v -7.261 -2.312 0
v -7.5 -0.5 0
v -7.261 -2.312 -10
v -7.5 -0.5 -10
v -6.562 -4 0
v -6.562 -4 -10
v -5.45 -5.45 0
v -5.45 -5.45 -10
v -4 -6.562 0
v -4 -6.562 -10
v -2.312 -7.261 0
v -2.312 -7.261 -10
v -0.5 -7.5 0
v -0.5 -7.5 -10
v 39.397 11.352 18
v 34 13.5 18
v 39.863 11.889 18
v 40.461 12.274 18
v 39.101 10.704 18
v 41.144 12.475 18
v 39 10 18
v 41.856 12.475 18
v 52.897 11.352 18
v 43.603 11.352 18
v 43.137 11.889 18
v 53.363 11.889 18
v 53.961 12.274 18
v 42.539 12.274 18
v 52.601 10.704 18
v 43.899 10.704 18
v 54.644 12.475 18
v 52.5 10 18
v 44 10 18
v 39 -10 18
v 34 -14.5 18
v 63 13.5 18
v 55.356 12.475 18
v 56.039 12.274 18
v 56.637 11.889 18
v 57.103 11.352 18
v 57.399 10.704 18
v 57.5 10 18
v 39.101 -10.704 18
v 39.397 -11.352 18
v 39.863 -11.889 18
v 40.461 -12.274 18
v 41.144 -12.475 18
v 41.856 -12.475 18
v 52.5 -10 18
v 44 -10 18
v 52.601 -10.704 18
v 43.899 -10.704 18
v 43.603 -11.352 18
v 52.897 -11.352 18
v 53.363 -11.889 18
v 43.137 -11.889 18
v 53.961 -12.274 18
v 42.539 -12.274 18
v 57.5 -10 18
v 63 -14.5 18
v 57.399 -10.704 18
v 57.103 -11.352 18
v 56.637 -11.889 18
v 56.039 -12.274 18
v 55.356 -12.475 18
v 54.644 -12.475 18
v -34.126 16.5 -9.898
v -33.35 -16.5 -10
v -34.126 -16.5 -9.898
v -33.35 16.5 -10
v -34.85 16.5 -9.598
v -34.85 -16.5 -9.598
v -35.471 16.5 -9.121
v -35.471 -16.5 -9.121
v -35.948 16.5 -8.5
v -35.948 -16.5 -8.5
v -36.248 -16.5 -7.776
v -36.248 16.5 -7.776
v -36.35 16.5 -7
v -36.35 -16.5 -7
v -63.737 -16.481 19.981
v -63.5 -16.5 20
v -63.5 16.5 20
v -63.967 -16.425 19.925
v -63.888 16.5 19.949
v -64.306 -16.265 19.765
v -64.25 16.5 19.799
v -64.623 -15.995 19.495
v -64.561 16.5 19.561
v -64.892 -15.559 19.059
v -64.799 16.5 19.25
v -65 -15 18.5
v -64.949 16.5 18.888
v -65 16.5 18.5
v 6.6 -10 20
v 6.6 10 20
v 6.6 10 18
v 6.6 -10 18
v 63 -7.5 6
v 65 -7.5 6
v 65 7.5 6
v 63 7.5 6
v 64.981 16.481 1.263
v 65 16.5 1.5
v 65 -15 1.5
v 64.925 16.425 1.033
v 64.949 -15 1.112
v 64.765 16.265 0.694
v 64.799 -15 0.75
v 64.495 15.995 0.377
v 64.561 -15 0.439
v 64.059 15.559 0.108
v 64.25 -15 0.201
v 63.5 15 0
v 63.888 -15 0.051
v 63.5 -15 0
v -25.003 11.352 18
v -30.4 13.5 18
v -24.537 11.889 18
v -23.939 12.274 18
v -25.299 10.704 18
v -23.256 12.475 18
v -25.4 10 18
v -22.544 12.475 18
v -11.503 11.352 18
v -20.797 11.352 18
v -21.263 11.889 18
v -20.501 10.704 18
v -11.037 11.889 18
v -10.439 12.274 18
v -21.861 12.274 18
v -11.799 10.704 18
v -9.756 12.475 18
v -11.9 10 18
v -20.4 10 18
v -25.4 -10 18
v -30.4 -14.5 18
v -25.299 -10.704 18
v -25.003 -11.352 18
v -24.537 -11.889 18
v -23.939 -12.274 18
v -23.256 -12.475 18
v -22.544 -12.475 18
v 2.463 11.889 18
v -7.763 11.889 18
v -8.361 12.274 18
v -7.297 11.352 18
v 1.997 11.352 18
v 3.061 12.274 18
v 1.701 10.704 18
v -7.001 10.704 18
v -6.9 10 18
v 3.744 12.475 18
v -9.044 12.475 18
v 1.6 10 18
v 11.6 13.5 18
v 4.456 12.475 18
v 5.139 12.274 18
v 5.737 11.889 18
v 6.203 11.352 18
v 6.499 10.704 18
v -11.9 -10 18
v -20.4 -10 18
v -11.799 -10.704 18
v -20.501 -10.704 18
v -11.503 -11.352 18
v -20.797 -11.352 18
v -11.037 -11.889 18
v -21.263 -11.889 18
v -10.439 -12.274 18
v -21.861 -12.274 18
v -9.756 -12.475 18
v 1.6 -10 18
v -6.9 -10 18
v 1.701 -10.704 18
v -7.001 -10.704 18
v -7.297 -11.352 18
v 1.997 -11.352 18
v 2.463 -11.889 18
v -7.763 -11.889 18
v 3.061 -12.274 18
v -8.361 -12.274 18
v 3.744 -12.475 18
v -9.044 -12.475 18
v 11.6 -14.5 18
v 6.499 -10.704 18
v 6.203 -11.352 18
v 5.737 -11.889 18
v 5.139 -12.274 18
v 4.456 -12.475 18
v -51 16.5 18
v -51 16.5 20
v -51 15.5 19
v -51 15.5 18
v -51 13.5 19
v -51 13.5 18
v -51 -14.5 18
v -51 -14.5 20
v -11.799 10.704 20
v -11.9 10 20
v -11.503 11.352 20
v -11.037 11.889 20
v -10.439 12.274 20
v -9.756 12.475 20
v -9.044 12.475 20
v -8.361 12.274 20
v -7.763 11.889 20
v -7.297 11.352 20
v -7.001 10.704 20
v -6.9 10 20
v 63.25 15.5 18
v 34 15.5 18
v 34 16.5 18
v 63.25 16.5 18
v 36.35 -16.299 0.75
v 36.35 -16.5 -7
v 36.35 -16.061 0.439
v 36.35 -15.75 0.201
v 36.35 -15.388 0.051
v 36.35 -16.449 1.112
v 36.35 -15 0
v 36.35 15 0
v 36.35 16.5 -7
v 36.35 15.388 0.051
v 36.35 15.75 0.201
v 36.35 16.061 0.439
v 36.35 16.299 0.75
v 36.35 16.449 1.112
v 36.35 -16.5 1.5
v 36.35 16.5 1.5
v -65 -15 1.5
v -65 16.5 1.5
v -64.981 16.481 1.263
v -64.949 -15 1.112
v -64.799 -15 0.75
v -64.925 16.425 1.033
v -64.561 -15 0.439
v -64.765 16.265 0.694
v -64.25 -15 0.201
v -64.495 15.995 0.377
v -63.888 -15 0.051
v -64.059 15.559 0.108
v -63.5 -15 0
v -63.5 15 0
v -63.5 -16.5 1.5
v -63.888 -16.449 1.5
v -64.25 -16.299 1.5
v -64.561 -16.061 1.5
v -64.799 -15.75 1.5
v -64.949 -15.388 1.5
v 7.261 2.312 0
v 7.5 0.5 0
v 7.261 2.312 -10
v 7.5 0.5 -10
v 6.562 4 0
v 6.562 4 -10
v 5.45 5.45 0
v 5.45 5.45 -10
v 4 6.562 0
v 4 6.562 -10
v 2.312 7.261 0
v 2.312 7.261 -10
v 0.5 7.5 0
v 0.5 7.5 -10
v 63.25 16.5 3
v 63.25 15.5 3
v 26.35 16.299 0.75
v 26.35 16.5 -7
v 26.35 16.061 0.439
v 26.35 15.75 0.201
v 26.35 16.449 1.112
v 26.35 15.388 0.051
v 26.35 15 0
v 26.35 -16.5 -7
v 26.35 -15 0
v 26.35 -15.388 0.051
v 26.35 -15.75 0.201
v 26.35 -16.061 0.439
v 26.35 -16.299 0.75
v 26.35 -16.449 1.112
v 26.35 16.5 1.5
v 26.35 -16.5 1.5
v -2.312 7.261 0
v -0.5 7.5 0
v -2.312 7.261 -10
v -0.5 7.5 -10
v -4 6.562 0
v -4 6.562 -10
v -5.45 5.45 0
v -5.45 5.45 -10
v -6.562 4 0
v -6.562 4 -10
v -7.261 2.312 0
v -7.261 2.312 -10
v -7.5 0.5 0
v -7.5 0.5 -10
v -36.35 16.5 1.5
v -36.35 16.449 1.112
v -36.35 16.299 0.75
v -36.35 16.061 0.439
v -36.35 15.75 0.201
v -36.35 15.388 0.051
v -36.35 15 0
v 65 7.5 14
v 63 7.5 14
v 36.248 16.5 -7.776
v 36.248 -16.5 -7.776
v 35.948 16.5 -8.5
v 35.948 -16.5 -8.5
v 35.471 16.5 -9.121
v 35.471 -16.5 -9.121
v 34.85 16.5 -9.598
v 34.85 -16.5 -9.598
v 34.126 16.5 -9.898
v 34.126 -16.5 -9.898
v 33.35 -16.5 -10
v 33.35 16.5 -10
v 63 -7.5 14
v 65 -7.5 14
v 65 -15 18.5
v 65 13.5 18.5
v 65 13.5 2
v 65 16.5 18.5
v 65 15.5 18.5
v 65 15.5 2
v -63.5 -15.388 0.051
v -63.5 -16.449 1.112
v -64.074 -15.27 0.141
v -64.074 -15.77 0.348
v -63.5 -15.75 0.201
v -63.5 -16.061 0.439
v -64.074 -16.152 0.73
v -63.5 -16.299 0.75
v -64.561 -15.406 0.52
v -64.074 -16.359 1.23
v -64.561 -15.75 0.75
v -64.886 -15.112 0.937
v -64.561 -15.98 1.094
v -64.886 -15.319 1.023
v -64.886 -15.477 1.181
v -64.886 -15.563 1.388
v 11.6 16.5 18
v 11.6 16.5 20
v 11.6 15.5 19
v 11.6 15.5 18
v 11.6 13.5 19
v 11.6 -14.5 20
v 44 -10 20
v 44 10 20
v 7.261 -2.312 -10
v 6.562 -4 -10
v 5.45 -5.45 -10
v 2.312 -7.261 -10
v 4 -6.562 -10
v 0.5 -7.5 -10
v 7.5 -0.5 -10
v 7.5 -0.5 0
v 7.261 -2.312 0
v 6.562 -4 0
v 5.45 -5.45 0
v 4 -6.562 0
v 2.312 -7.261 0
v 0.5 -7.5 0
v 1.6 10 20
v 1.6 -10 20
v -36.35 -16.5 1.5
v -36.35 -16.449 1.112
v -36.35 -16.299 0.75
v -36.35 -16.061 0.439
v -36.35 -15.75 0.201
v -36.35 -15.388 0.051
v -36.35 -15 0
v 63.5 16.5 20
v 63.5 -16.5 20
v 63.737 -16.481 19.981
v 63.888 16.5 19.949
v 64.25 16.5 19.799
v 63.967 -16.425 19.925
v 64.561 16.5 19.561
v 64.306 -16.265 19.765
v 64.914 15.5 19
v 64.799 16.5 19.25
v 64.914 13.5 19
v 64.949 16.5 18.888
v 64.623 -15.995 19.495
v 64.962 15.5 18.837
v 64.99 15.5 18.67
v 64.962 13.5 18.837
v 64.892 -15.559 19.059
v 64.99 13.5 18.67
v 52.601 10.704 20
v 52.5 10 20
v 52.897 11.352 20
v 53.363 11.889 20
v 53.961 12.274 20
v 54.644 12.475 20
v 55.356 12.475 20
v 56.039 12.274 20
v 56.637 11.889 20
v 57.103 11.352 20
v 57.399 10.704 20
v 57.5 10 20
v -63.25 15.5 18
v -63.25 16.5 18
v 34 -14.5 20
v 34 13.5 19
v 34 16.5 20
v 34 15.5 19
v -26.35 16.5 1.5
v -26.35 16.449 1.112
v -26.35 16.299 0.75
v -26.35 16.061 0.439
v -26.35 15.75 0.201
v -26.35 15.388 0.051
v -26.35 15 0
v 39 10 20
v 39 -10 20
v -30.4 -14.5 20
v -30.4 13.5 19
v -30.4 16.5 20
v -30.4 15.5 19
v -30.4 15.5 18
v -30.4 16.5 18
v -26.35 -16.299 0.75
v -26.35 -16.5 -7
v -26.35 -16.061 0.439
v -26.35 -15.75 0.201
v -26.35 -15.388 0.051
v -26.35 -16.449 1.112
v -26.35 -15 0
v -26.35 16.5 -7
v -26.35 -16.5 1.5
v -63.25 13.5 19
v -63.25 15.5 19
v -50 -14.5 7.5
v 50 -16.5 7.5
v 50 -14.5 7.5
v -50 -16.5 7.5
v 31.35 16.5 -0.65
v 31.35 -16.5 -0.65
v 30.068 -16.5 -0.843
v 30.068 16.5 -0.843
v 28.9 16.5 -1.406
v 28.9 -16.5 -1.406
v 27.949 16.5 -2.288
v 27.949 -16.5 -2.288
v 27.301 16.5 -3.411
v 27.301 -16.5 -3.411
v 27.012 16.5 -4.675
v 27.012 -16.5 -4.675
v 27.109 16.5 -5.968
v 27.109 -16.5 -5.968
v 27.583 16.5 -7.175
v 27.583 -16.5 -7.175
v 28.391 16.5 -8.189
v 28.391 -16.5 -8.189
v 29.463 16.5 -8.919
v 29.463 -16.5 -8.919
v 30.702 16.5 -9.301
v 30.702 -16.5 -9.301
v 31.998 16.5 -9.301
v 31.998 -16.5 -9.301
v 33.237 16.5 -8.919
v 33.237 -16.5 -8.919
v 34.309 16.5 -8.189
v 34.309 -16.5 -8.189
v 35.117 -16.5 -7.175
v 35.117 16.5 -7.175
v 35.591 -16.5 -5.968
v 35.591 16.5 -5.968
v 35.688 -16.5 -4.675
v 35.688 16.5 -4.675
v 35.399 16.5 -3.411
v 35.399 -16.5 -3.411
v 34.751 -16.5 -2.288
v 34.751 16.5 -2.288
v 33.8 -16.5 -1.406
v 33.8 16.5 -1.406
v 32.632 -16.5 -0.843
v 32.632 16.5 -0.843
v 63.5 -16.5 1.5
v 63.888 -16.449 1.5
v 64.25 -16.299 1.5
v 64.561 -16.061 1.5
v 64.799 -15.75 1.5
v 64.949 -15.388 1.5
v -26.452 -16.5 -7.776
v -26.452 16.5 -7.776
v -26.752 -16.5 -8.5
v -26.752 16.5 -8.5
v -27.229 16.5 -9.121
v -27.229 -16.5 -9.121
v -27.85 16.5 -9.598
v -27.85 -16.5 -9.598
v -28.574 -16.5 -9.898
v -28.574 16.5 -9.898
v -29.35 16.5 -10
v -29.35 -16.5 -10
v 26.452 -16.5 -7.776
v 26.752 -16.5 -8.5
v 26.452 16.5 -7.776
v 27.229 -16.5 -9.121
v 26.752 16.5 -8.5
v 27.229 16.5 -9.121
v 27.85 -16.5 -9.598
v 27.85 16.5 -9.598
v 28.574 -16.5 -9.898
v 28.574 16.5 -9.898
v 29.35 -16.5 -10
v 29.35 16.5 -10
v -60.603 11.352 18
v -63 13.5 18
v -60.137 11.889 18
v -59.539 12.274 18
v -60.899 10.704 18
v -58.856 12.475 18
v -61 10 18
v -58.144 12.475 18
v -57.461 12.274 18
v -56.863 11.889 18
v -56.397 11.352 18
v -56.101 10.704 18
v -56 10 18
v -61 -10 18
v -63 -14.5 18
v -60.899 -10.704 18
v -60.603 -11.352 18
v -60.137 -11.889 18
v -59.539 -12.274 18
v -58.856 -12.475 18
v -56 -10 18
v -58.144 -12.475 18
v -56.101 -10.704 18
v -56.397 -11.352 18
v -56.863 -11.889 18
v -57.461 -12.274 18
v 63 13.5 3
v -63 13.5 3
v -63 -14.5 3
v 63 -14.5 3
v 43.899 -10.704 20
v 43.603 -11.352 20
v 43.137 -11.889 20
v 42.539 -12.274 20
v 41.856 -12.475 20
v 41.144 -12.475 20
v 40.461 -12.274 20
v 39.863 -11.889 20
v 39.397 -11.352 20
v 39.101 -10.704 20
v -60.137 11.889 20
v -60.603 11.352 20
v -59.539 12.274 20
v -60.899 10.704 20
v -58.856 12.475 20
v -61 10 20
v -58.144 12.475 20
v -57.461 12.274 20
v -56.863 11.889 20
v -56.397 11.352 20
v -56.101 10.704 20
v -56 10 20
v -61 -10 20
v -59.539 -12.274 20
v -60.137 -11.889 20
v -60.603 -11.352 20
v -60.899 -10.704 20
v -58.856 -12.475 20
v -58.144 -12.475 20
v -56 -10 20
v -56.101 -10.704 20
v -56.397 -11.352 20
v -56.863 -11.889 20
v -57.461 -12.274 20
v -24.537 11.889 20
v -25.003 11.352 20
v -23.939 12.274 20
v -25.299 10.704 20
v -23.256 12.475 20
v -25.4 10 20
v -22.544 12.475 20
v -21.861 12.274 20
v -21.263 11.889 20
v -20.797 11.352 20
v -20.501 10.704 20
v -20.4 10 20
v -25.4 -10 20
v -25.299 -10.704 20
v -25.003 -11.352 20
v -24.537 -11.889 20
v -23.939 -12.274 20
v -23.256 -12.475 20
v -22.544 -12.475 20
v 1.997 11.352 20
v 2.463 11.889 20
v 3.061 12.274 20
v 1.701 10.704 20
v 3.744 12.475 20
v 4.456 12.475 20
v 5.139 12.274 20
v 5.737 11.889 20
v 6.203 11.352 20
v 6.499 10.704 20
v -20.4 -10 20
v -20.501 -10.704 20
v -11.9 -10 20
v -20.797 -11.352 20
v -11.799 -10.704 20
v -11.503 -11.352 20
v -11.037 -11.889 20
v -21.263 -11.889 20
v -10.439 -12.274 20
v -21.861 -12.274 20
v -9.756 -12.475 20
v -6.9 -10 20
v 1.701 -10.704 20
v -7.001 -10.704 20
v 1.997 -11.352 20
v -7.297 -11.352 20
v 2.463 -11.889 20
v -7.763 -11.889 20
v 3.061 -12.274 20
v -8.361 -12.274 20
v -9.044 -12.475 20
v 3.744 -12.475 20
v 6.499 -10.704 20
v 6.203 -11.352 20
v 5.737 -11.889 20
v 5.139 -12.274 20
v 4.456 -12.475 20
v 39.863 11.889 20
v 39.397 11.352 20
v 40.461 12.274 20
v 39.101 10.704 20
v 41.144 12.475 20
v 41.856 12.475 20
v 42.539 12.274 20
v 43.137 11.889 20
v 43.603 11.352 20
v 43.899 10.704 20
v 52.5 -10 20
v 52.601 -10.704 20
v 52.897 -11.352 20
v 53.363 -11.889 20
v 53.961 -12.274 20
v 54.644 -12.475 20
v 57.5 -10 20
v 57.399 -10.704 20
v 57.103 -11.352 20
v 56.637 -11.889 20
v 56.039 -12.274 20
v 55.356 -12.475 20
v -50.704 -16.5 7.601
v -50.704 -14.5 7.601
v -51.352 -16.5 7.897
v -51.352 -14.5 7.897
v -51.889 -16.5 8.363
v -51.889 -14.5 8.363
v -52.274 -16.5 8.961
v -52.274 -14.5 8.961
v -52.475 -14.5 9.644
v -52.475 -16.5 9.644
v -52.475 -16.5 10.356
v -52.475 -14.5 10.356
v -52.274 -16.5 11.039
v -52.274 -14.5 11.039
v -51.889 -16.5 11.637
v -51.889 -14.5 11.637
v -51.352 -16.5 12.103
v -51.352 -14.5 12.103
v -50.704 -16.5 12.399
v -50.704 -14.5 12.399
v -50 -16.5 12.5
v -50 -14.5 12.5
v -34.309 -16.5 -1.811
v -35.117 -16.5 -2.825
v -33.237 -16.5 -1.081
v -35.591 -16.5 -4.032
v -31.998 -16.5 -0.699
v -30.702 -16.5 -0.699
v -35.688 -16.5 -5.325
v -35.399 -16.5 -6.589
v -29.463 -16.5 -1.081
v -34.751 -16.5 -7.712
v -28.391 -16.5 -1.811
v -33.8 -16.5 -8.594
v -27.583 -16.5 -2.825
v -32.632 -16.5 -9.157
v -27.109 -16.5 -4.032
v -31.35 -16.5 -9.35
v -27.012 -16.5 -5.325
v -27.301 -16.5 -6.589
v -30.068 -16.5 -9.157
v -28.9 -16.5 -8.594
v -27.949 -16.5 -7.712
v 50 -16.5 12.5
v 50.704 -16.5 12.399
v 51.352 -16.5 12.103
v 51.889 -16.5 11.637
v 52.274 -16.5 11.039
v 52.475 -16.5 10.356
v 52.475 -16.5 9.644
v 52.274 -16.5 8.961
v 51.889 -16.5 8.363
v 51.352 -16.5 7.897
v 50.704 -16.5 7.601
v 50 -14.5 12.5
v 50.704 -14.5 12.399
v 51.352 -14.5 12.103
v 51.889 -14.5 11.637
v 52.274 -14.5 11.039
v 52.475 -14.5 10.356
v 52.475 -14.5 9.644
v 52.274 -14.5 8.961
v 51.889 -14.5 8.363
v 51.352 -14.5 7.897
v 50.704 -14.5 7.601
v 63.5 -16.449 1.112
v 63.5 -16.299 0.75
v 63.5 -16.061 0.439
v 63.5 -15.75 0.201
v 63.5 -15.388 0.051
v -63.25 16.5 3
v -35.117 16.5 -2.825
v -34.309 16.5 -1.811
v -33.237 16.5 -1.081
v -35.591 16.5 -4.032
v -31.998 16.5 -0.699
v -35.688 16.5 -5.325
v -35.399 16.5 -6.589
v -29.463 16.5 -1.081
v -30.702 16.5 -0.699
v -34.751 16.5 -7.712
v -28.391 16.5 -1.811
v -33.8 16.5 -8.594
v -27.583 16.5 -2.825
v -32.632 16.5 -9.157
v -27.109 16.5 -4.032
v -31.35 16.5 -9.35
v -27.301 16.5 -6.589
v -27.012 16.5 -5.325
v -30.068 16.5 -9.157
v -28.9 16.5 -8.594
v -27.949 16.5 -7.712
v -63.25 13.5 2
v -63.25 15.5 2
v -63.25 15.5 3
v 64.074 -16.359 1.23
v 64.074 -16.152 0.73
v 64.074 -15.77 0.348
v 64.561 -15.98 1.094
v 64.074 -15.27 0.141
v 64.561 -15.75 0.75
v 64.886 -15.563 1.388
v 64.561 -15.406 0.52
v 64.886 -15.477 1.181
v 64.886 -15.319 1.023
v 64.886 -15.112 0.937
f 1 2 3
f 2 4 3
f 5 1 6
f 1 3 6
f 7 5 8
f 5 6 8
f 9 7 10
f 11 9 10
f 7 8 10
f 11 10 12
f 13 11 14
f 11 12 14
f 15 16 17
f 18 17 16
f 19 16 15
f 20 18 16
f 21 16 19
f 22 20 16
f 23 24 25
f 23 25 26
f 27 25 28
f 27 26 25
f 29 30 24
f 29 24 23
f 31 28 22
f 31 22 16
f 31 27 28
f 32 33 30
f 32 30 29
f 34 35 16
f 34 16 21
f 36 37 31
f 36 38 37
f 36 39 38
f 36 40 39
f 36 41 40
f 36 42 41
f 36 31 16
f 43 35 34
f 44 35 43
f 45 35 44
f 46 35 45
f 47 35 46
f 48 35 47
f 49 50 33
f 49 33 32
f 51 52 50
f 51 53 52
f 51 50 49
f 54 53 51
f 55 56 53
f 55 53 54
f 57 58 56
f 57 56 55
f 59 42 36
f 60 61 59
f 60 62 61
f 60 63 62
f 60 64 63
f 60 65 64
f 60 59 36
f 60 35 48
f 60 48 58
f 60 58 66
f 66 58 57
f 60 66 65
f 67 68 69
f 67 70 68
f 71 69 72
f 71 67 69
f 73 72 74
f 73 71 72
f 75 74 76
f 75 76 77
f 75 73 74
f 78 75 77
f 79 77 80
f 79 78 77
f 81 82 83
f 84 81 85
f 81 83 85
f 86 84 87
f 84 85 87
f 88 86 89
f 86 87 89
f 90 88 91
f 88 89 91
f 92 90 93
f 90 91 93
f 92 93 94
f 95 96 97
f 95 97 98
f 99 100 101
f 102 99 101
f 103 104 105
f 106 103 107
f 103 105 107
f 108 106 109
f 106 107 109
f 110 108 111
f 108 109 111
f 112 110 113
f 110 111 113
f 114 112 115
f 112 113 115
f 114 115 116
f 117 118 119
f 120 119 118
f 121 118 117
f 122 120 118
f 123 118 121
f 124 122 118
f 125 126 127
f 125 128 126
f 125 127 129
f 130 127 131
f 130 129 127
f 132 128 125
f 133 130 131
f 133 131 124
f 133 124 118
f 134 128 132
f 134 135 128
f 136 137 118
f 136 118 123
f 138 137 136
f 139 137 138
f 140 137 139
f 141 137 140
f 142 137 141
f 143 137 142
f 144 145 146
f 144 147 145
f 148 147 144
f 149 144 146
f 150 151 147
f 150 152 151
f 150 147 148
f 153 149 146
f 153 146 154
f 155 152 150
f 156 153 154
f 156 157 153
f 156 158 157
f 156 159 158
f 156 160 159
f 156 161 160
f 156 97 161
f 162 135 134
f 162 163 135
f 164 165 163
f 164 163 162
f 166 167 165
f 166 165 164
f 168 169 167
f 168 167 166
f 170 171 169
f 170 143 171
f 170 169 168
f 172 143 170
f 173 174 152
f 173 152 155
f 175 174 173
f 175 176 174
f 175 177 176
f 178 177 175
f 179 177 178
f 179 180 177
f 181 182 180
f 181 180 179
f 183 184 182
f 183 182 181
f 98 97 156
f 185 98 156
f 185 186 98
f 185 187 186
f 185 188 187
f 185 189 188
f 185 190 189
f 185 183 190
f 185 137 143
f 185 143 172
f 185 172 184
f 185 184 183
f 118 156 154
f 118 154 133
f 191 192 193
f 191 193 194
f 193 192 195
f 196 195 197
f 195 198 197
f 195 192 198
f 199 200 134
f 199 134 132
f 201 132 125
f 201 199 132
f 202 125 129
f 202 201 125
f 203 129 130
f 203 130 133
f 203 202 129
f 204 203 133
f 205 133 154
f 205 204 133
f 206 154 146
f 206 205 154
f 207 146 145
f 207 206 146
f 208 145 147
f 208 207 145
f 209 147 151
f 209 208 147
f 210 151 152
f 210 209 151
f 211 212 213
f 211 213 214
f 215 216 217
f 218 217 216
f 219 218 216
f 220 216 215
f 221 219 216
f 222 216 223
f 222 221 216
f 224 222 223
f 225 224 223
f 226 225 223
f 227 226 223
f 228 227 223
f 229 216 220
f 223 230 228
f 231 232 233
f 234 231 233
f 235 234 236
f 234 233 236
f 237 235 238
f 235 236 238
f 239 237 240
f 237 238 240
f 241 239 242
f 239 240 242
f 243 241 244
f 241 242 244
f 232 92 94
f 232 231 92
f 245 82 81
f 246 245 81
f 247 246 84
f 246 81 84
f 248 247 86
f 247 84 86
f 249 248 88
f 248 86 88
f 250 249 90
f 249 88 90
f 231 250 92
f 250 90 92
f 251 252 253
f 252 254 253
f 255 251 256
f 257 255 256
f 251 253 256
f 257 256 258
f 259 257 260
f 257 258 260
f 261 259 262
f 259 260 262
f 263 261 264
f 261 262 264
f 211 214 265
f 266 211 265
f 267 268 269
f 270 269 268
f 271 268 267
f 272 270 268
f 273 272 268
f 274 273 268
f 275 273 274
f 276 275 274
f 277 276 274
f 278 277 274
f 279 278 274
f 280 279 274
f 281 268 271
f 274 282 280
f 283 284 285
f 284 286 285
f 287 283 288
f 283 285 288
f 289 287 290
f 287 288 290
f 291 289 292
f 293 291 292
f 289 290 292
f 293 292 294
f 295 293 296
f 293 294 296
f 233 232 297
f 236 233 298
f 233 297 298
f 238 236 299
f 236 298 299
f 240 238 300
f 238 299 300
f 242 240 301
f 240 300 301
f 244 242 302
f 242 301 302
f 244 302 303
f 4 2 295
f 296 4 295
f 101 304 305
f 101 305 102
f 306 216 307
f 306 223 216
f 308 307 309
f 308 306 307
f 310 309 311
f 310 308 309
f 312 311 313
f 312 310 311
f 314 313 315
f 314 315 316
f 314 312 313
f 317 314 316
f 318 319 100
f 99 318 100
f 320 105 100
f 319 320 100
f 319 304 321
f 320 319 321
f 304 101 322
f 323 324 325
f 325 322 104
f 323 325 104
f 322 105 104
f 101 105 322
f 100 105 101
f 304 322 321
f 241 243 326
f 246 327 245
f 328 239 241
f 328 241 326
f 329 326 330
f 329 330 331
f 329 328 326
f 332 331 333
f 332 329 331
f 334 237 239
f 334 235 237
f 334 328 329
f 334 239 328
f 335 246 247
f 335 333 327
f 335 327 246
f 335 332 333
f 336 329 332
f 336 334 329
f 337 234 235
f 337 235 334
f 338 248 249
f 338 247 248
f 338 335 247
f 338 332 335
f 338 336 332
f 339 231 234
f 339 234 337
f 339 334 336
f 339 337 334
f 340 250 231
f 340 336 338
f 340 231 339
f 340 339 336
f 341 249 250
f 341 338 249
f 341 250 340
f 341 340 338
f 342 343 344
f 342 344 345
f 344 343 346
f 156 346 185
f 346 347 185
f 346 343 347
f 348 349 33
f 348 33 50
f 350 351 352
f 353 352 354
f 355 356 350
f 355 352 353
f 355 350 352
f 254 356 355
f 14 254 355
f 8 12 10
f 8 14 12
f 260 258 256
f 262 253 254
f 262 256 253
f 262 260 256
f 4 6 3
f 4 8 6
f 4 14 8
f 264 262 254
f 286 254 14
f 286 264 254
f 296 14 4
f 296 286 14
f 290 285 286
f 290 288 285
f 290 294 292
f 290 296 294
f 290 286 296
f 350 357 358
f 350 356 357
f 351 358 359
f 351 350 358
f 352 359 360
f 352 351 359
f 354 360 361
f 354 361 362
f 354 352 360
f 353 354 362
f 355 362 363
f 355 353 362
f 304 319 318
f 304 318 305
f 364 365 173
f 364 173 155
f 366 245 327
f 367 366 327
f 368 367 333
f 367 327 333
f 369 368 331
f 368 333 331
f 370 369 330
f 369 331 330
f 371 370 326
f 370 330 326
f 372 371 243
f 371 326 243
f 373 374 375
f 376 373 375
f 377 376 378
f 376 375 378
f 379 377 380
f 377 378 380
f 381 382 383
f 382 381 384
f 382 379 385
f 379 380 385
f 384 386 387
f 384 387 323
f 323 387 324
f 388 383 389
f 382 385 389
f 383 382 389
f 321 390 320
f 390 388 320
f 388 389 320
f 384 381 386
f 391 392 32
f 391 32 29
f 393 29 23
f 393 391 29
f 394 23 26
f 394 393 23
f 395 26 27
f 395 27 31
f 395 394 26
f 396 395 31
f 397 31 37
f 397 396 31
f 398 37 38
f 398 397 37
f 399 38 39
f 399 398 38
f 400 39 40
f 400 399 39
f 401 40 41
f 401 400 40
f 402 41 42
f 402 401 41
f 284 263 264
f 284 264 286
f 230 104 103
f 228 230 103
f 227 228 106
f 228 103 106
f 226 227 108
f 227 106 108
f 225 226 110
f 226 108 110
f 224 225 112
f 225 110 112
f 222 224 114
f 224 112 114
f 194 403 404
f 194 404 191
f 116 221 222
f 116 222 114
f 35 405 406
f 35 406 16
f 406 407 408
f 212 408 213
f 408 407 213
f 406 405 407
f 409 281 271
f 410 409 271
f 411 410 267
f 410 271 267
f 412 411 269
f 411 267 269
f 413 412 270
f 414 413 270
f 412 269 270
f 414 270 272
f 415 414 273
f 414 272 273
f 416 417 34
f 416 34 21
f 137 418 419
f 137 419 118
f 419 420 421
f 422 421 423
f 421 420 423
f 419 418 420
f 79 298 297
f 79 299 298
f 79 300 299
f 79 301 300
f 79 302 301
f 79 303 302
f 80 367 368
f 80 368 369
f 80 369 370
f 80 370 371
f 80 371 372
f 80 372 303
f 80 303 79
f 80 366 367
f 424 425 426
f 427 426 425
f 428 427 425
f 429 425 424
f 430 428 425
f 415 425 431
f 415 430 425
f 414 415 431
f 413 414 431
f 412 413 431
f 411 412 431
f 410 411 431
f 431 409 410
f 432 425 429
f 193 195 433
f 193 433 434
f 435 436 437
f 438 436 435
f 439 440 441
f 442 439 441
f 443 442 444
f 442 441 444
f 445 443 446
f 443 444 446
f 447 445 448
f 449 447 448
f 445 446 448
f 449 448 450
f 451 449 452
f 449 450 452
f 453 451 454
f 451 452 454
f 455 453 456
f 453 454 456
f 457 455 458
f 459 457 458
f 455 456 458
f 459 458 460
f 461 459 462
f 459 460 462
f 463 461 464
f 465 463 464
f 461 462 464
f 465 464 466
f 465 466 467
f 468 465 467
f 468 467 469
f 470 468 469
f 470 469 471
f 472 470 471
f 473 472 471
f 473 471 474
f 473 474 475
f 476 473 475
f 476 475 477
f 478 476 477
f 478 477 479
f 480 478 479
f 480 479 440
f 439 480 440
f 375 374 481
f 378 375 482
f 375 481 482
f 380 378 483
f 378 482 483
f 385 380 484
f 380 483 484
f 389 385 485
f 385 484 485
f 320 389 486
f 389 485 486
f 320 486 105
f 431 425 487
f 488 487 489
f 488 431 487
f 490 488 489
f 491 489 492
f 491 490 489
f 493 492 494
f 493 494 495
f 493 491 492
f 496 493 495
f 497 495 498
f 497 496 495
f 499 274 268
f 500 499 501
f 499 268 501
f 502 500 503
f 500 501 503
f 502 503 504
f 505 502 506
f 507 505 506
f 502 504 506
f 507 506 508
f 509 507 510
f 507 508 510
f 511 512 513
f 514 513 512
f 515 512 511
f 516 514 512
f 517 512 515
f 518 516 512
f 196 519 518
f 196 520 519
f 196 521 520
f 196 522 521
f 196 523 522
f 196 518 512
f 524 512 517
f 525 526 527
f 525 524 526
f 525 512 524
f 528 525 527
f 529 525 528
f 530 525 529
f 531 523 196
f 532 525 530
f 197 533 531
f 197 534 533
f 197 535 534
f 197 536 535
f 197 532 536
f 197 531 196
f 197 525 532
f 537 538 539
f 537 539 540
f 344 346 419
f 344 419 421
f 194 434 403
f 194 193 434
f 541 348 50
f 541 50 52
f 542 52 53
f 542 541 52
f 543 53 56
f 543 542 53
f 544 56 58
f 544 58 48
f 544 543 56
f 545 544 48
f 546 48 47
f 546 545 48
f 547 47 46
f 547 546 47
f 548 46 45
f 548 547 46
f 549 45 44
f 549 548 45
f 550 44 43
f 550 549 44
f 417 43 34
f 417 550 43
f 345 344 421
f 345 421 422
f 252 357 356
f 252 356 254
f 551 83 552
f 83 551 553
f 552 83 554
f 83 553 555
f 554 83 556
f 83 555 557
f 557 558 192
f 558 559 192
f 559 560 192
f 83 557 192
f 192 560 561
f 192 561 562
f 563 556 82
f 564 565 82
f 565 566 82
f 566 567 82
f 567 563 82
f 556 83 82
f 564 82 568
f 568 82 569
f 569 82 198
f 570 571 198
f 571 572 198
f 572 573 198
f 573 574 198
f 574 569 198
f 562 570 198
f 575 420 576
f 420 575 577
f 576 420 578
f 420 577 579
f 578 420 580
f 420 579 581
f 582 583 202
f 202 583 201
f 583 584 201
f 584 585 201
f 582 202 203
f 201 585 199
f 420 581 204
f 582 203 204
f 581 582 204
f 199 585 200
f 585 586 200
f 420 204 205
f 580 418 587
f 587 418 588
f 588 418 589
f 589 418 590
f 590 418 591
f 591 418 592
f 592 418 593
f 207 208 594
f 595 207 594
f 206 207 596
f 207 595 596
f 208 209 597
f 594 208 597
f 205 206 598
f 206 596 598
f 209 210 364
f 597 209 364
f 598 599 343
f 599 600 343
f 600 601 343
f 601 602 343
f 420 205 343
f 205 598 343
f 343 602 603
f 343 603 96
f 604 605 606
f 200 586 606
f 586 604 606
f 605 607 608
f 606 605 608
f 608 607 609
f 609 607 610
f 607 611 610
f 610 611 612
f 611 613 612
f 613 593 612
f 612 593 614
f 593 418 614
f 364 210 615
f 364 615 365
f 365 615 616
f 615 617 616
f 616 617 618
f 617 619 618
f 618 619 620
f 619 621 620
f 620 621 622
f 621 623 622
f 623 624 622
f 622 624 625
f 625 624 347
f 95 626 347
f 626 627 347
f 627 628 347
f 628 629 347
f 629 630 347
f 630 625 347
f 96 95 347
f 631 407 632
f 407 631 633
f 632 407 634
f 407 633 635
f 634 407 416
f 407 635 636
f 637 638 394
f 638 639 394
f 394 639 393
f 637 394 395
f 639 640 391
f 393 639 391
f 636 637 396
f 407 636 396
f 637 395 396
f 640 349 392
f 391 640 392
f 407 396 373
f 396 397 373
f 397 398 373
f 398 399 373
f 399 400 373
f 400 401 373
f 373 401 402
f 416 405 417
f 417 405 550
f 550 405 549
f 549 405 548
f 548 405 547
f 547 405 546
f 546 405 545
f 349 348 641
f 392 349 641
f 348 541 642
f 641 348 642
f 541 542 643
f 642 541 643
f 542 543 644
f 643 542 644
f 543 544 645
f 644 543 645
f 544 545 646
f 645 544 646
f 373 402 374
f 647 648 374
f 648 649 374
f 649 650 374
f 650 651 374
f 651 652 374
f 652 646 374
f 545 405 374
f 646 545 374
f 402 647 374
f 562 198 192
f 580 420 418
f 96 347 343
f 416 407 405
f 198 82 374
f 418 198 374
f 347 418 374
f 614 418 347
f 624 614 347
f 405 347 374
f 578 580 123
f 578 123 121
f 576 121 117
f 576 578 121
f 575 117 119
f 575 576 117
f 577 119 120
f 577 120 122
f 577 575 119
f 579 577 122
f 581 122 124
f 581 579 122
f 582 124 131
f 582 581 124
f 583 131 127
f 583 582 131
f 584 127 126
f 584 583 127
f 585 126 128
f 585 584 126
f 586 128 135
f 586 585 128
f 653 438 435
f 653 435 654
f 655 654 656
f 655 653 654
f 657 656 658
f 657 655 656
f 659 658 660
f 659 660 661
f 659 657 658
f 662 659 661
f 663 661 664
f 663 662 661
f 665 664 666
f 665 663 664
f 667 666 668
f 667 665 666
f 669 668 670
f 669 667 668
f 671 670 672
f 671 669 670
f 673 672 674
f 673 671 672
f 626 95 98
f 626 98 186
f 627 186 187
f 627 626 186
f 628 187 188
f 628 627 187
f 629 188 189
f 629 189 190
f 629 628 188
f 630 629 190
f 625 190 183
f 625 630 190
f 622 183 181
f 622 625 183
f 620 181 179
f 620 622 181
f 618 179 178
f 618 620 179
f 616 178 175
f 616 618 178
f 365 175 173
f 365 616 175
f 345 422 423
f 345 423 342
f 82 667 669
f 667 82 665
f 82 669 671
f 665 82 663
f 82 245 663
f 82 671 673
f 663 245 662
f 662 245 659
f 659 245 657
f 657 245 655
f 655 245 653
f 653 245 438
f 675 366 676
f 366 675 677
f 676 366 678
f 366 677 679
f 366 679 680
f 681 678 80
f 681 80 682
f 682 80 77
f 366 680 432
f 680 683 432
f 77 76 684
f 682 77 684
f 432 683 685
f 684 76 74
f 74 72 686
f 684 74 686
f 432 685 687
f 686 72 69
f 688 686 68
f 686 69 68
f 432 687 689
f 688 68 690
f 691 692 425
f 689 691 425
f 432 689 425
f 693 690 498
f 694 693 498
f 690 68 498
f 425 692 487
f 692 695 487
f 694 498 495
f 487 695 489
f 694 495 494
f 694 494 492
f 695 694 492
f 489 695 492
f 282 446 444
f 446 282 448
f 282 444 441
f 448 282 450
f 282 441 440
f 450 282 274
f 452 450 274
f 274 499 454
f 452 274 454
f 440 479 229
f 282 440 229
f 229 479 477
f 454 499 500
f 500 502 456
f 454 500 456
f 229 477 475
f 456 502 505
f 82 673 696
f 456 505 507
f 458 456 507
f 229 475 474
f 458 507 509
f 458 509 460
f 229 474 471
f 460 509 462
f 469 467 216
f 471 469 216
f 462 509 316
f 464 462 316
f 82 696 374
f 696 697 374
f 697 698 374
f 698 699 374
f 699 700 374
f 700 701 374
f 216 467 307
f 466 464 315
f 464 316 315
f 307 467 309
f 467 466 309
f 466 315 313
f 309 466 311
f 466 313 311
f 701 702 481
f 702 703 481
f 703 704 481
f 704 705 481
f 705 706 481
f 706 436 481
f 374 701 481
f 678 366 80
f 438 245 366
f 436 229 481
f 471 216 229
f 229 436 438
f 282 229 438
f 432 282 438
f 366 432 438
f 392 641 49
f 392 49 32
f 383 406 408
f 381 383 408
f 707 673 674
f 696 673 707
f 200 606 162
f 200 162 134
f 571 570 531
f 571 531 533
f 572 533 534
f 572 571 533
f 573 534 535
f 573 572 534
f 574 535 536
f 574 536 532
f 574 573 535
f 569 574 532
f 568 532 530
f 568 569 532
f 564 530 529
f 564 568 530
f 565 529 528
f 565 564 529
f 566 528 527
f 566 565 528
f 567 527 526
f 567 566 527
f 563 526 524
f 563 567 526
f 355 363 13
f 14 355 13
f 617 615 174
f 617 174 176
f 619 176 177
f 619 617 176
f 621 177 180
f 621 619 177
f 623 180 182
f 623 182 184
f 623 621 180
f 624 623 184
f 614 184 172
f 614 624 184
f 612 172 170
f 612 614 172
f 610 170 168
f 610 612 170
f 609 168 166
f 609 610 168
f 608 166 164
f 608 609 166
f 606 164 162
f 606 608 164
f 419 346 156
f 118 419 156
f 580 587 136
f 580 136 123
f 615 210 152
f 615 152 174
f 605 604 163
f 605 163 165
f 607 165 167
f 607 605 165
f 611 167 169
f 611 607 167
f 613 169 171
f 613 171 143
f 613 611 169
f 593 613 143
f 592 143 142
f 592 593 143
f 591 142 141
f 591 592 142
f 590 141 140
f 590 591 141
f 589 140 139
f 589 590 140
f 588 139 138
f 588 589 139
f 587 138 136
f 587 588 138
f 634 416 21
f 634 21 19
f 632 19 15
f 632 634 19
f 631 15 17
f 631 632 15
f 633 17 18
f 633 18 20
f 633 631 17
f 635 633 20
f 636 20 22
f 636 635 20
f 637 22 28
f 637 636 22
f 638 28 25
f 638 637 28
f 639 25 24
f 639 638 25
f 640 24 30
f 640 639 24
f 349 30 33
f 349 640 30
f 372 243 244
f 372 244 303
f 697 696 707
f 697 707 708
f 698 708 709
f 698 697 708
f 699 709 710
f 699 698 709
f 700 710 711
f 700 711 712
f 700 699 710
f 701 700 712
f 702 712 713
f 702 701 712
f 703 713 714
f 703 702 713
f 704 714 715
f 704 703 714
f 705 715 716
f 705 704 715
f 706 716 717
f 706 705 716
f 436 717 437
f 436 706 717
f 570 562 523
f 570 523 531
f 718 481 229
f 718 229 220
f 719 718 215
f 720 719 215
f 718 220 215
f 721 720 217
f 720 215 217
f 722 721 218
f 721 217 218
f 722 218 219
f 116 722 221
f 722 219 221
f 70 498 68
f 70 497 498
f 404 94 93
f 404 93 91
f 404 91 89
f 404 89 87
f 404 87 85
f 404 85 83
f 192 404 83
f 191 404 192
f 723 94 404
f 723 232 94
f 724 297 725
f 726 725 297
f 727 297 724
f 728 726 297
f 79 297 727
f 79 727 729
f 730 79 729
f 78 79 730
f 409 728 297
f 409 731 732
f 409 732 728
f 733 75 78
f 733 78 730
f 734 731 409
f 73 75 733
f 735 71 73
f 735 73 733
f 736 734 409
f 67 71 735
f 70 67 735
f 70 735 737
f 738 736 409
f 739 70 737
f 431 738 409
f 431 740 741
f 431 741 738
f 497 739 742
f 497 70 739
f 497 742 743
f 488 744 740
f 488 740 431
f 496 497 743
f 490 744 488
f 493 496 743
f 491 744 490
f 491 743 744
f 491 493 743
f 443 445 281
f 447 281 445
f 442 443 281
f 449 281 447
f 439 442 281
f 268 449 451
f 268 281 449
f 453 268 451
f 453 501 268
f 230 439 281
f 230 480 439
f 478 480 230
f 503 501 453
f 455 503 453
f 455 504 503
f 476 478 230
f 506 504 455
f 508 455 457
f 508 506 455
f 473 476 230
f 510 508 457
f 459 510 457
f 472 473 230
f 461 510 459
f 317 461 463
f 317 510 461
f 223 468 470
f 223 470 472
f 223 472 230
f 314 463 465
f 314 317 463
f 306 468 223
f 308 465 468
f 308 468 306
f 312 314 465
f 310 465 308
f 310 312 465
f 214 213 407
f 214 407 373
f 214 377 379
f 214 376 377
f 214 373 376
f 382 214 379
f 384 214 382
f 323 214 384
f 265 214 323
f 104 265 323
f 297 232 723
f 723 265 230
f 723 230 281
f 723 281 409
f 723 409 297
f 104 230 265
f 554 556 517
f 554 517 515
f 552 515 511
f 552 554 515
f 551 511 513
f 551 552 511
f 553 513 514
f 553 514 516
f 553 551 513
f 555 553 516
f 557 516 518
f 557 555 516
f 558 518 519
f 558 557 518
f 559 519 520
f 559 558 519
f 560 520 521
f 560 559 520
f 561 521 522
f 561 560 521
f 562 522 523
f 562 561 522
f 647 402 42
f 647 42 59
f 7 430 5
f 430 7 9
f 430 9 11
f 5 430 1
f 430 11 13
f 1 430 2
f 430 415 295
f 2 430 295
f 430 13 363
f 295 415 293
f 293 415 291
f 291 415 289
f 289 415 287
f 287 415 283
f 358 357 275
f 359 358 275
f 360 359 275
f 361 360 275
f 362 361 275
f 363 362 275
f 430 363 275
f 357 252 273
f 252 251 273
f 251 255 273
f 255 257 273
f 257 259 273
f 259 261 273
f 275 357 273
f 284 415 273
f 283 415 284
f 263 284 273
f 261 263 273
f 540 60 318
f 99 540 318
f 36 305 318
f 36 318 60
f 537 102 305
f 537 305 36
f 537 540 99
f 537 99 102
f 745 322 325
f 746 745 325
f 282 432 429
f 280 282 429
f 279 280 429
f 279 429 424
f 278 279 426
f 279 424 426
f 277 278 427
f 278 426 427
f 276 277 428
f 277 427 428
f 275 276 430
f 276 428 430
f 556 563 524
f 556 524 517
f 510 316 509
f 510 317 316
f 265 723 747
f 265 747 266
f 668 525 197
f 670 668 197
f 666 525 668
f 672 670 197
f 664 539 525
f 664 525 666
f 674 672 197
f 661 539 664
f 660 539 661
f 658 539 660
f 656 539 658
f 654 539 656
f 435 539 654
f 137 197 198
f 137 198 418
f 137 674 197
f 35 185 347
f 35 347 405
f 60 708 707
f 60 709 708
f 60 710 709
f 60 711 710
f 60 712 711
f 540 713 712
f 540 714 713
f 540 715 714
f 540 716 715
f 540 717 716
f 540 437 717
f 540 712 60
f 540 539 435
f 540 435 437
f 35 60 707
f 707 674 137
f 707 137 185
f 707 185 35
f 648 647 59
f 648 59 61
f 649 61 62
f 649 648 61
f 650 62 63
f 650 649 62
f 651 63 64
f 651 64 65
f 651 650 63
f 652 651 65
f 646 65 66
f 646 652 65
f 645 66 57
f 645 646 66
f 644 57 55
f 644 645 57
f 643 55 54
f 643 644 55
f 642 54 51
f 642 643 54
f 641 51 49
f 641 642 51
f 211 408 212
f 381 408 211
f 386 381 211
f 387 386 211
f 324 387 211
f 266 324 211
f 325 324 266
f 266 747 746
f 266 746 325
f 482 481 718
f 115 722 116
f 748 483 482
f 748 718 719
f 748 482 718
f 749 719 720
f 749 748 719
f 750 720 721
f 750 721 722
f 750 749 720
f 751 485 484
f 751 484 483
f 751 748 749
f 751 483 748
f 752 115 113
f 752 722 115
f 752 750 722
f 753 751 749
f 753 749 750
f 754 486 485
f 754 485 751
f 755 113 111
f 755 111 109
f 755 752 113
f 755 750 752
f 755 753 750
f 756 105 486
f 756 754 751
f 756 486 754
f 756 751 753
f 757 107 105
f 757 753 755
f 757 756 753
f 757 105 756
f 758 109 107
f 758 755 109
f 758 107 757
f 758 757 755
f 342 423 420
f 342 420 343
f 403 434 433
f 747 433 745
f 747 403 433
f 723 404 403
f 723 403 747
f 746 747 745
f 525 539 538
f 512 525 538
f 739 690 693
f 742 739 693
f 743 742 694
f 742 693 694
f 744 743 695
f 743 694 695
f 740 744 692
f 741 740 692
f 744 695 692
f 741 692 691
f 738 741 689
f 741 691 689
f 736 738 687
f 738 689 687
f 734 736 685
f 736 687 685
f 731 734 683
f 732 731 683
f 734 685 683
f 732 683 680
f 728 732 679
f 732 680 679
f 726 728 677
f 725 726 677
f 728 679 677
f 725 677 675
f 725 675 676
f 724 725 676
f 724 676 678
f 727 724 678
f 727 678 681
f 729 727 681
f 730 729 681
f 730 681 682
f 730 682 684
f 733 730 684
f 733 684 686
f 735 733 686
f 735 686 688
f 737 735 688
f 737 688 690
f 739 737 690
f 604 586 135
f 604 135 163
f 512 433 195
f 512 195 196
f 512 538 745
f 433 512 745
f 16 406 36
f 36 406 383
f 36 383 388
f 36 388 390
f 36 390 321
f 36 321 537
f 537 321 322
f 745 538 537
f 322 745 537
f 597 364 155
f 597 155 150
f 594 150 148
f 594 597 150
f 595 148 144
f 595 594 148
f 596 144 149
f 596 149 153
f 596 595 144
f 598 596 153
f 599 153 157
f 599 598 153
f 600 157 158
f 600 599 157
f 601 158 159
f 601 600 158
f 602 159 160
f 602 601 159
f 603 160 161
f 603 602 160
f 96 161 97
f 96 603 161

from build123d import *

# Parameters (mm, degrees)
ESBO_O1_W                = 130
ESBO_O1_H                = 33
RESSALTO_EXTRUS_O1_DEPTH = 3
ESBO_O2_W                = 130
ESBO_O2_H                = 33
ESBO_O2_W_2              = 126
ESBO_O2_H_2              = 29
EXTRUS_O_FINA1_DEPTH     = 17
ESBO_O3_W                = 126.5
ESBO_O3_H                = 15
CORTE_EXTRUS_O1_DEPTH    = 2
ESBO_O4_W                = 8
ESBO_O4_H                = 15
CORTE_EXTRUS_O2_DEPTH    = 2
ESBO_O7_W                = 42
ESBO_O7_H                = 2
ESBO_O7_W_2              = 12
ESBO_O7_W_3              = 29
RESSALTO_EXTRUS_O2_DEPTH = 29
ESBO_O8_W                = 20.6
ESBO_O8_H                = 2
ESBO_O8_W_2              = 22.4
CORTE_EXTRUS_O4_DEPTH    = 2
CORTE_EXTRUS_O3_REACH    = 134.56
ESBO_O5_W                = 17
ESBO_O5_H                = 2
CORTE_EXTRUS_O5_DEPTH    = 2
CORTE_EXTRUS_O6_DEPTH    = 2
ESBO_O11_W               = 10
ESBO_O11_H               = 33
RESSALTO_EXTRUS_O3_DEPTH = 10
ESBO_O12_R               = 4.35
CORTE_EXTRUS_O7_DEPTH    = 76.591004756
ESBO_O13_W               = 15
ESBO_O13_H               = 15
RESSALTO_EXTRUS_O4_DEPTH = 10
FILETE1_R                = 7
FILETE2_R                = 3
FILETE3_R                = 1.5


with BuildPart() as part:
    # Esboço1 → Ressalto-extrusão1 (new body)
    with BuildSketch(Plane.XY):
        Rectangle(ESBO_O1_W, ESBO_O1_H)
    extrude(amount=RESSALTO_EXTRUS_O1_DEPTH)

    # Esboço2 → Extrusão-Fina1 (add)
    with BuildSketch(Plane.XY.offset(3)):
        Rectangle(ESBO_O2_W, ESBO_O2_H)
        Rectangle(ESBO_O2_W_2, ESBO_O2_H_2, mode=Mode.SUBTRACT)
    extrude(amount=EXTRUS_O_FINA1_DEPTH)

    # Esboço3 → Corte-extrusão1 (cut)
    with BuildSketch(Plane(origin=(0, 16.5, 0), x_dir=(1, 0, 0), z_dir=(0, 1, 0))):
        with Locations((0, -10.5)):
            Rectangle(ESBO_O3_W, ESBO_O3_H)
    extrude(amount=-CORTE_EXTRUS_O1_DEPTH, mode=Mode.SUBTRACT)

    # Esboço4 → Corte-extrusão2 (cut)
    with BuildSketch(Plane(origin=(65, 0, 0), x_dir=(0, 0, -1), z_dir=(1, 0, 0))):
        with Locations((-10, 0)):
            Rectangle(ESBO_O4_W, ESBO_O4_H)
    extrude(amount=-CORTE_EXTRUS_O2_DEPTH, mode=Mode.SUBTRACT)

    # Esboço7 → Ressalto-extrusão2 (add)
    with BuildSketch(Plane(origin=(0, -14.5, 0), x_dir=(1, 0, 0), z_dir=(0, 1, 0))):
        with Locations((-9.4, -19)):
            Rectangle(ESBO_O7_W, ESBO_O7_H)
        with Locations((-57, -19)):
            Rectangle(ESBO_O7_W_2, ESBO_O7_H)
        with Locations((48.5, -19)):
            Rectangle(ESBO_O7_W_3, ESBO_O7_H)
    extrude(amount=RESSALTO_EXTRUS_O2_DEPTH)

    # Esboço8 → Corte-extrusão4 (cut)
    with BuildSketch(Plane(origin=(0, 16.5, 0), x_dir=(1, 0, 0), z_dir=(0, 1, 0))):
        with Locations((-40.7, -19)):
            Rectangle(ESBO_O8_W, ESBO_O8_H)
        with Locations((22.8, -19)):
            Rectangle(ESBO_O8_W_2, ESBO_O8_H)
    extrude(amount=-CORTE_EXTRUS_O4_DEPTH, mode=Mode.SUBTRACT)

    # Corte-extrusão3: up to this face of the body (flat: up to its plane)
    corte_extrus_o3_end = Plane(part.part.faces().sort_by_distance((-63.25, 15.5, 10.5))[0])
    # Esboço5 → Corte-extrusão3 (cut, up to the picked face)
    with BuildSketch(Plane(origin=(65, 0, 0), x_dir=(0, 0, -1), z_dir=(1, 0, 0)), mode=Mode.PRIVATE) as corte_extrus_o3_sk1:
        with Locations((-10.5, 14.5)):
            Rectangle(ESBO_O5_W, ESBO_O5_H)
    corte_extrus_o3_tool1 = split(extrude(corte_extrus_o3_sk1.sketch, amount=-CORTE_EXTRUS_O3_REACH, mode=Mode.PRIVATE), bisect_by=corte_extrus_o3_end, keep=Keep.BOTH, mode=Mode.PRIVATE)
    add(corte_extrus_o3_tool1.solids().sort_by(Axis((65, 14.5, 10.5), (-1, 0, 0)))[0], mode=Mode.SUBTRACT)

    # Esboço9 → Corte-extrusão5 (cut)
    with BuildSketch(Plane.XY.offset(20)):
        with BuildLine():
            Line((-61, -10), (-61, 10))
            ThreePointArc((-61, 10), (-58.5, 12.5), (-56, 10))
            Line((-56, 10), (-56, -10))
            ThreePointArc((-56, -10), (-58.5, -12.5), (-61, -10))
        make_face()
        with BuildLine():
            Line((-25.4, -10), (-25.4, 10))
            ThreePointArc((-25.4, 10), (-22.9, 12.5), (-20.4, 10))
            Line((-20.4, 10), (-20.4, -10))
            ThreePointArc((-20.4, -10), (-22.9, -12.5), (-25.4, -10))
        make_face()
        with BuildLine():
            Line((-11.9, -10), (-11.9, 10))
            ThreePointArc((-11.9, 10), (-9.4, 12.5), (-6.9, 10))
            Line((-6.9, 10), (-6.9, -10))
            ThreePointArc((-6.9, -10), (-9.4, -12.5), (-11.9, -10))
        make_face()
        with BuildLine():
            Line((1.6, -10), (1.6, 10))
            ThreePointArc((1.6, 10), (4.1, 12.5), (6.6, 10))
            Line((6.6, 10), (6.6, -10))
            ThreePointArc((6.6, -10), (4.1, -12.5), (1.6, -10))
        make_face()
        with BuildLine():
            Line((39, -10), (39, 10))
            ThreePointArc((39, 10), (41.5, 12.5), (44, 10))
            Line((44, 10), (44, -10))
            ThreePointArc((44, -10), (41.5, -12.5), (39, -10))
        make_face()
        with BuildLine():
            Line((52.5, -10), (52.5, 10))
            ThreePointArc((52.5, 10), (55, 12.5), (57.5, 10))
            Line((57.5, 10), (57.5, -10))
            ThreePointArc((57.5, -10), (55, -12.5), (52.5, -10))
        make_face()
    extrude(amount=-CORTE_EXTRUS_O5_DEPTH, mode=Mode.SUBTRACT)

    # Esboço10 → Corte-extrusão6 (cut)
    with BuildSketch(Plane.XZ.offset(16.5)):
        with BuildLine():
            Line((-50, 12.5), (50, 12.5))
            ThreePointArc((50, 12.5), (52.5, 10), (50, 7.5))
            Line((50, 7.5), (-50, 7.5))
            ThreePointArc((-50, 7.5), (-52.5, 10), (-50, 12.5))
        make_face()
    extrude(amount=-CORTE_EXTRUS_O6_DEPTH, mode=Mode.SUBTRACT)

    # Esboço11 → Ressalto-extrusão3 (add)
    with BuildSketch(Plane(origin=(0, 0, 0), x_dir=(-1, 0, 0), z_dir=(0, 0, -1))):
        with Locations((-31.35, 0)):
            Rectangle(ESBO_O11_W, ESBO_O11_H)
        with Locations((31.35, 0)):
            Rectangle(ESBO_O11_W, ESBO_O11_H)
    extrude(amount=RESSALTO_EXTRUS_O3_DEPTH)

    # Esboço12 → Corte-extrusão7 (cut, through all)
    with BuildSketch(Plane.XZ.offset(16.5)):
        with Locations(Location((-31.35, -5, 0), (0, 0, 270))):
            Circle(ESBO_O12_R)
        with Locations(Location((31.35, -5, 0), (0, 0, 90))):
            Circle(ESBO_O12_R)
    extrude(amount=-CORTE_EXTRUS_O7_DEPTH, mode=Mode.SUBTRACT)

    # Esboço13 → Ressalto-extrusão4 (add)
    with BuildSketch(Plane(origin=(0, 0, 0), x_dir=(-1, 0, 0), z_dir=(0, 0, -1))):
        Rectangle(ESBO_O13_W, ESBO_O13_H)
    extrude(amount=RESSALTO_EXTRUS_O4_DEPTH)

    # Filete1
    filete1_edges = [part.edges().sort_by_distance(p)[0] for p in [
        (-7.5, -7.5, -5),
        (-7.5, 7.5, -5),
        (7.5, 7.5, -5),
        (7.5, -7.5, -5),
    ]]
    fillet(filete1_edges, radius=FILETE1_R)

    # Filete2
    filete2_edges = [part.edges().sort_by_distance(p)[0] for p in [
        (26.35, 0, -10),
        (36.35, 0, -10),
        (-36.35, 0, -10),
        (-26.35, 0, -10),
    ]]
    fillet(filete2_edges, radius=FILETE2_R)

    # Filete3
    # the kernel refuses this fillet: 1.5 mm, written as the material it takes off along each edge
    with BuildSketch(Plane(origin=(63.5, -15, 1.5), x_dir=(0, -1, 0), z_dir=(1, 0, 0))) as filete3_piece_1_section:
        Polygon((0, 0), (FILETE3_R, 0), (FILETE3_R, FILETE3_R), (0, FILETE3_R), align=None)
    filete3_piece_1 = extrude(amount=FILETE3_R, mode=Mode.PRIVATE)
    filete3_piece_1 = filete3_piece_1 - Plane(origin=(63.5, -15, 1.5), x_dir=(0, 0.7071067811865475, 0.7071067811865475), z_dir=(1, 0, 0)) * Sphere(FILETE3_R, mode=Mode.PRIVATE)
    add(filete3_piece_1, mode=Mode.SUBTRACT)
    with BuildSketch(Plane(origin=(-63.5, -15, 1.5), x_dir=(0, -1, 0), z_dir=(-1, 0, 0))) as filete3_piece_2_section:
        Polygon((0, 0), (FILETE3_R, 0), (FILETE3_R, -FILETE3_R), (0, -FILETE3_R), align=None)
    filete3_piece_2 = extrude(amount=FILETE3_R, mode=Mode.PRIVATE)
    filete3_piece_2 = filete3_piece_2 - Plane(origin=(-63.5, -15, 1.5), x_dir=(0, 0.7071067811865475, 0.7071067811865475), z_dir=(-1, 0, 0)) * Sphere(FILETE3_R, mode=Mode.PRIVATE)
    add(filete3_piece_2, mode=Mode.SUBTRACT)
    with BuildSketch(Plane(origin=(68.75, 16.5, 0), x_dir=(0, 0, 1), z_dir=(-1, 0, 0)), Plane(origin=(-36.35, 16.5, 0), x_dir=(0, 0, 1), z_dir=(-1, 0, 0))) as filete3_piece_3:
        with BuildLine():
            CenterArc((FILETE3_R, -FILETE3_R), FILETE3_R, 90, 90)
            Line((0, -FILETE3_R), (0, 0))
            Line((0, 0), (FILETE3_R, 0))
        make_face()
    extrude(amount=32.4, mode=Mode.SUBTRACT)
    with BuildSketch(Plane(origin=(26.35, 16.5, 0), x_dir=(0, 0, 1), z_dir=(-1, 0, 0))) as filete3_piece_4:
        with BuildLine():
            CenterArc((FILETE3_R, -FILETE3_R), FILETE3_R, 90, 90)
            Line((0, -FILETE3_R), (0, 0))
            Line((0, 0), (FILETE3_R, 0))
        make_face()
    extrude(amount=52.7, mode=Mode.SUBTRACT)
    with BuildSketch(Plane(origin=(65, -15, 0), x_dir=(-1, 0, 0), z_dir=(0, 1, 0)), Plane(origin=(-65, 20.25, 0), x_dir=(1, 0, 0), z_dir=(0, -1, 0))) as filete3_piece_5:
        with BuildLine():
            CenterArc((FILETE3_R, FILETE3_R), FILETE3_R, 180, 90)
            Line((0, FILETE3_R), (0, 0))
            Line((0, 0), (FILETE3_R, 0))
        make_face()
    extrude(amount=35.25, mode=Mode.SUBTRACT)
    with BuildSketch(Plane(origin=(65, -16.5, 1.5), x_dir=(-1, 0, 0), z_dir=(0, 0, 1)), Plane(origin=(-65, -16.5, 23.75), x_dir=(1, 0, 0), z_dir=(0, 0, -1))) as filete3_piece_6:
        with BuildLine():
            CenterArc((FILETE3_R, -FILETE3_R), FILETE3_R, 90, 90)
            Line((0, -FILETE3_R), (0, 0))
            Line((0, 0), (FILETE3_R, 0))
        make_face()
    extrude(amount=22.25, mode=Mode.SUBTRACT)
    with BuildSketch(Plane(origin=(65, -20.25, 20), x_dir=(0, 0, -1), z_dir=(0, 1, 0))) as filete3_piece_7:
        with BuildLine():
            CenterArc((FILETE3_R, FILETE3_R), FILETE3_R, 180, 90)
            Line((0, FILETE3_R), (0, 0))
            Line((0, 0), (FILETE3_R, 0))
        make_face()
    extrude(amount=40.5, mode=Mode.SUBTRACT)
    with BuildSketch(Plane(origin=(-65, 20.25, 20), x_dir=(1, 0, 0), z_dir=(0, -1, 0))) as filete3_piece_8:
        with BuildLine():
            CenterArc((FILETE3_R, -FILETE3_R), FILETE3_R, 90, 90)
            Line((0, -FILETE3_R), (0, 0))
            Line((0, 0), (FILETE3_R, 0))
        make_face()
    extrude(amount=40.5, mode=Mode.SUBTRACT)
    with BuildSketch(Plane(origin=(36.35, -16.5, 0), x_dir=(0, 0, 1), z_dir=(1, 0, 0)), Plane(origin=(-63.5, -16.5, 0), x_dir=(0, 0, 1), z_dir=(1, 0, 0))) as filete3_piece_9:
        with BuildLine():
            CenterArc((FILETE3_R, -FILETE3_R), FILETE3_R, 90, 90)
            Line((0, -FILETE3_R), (0, 0))
            Line((0, 0), (FILETE3_R, 0))
        make_face()
    extrude(amount=27.15, mode=Mode.SUBTRACT)
    with BuildSketch(Plane(origin=(-26.35, -16.5, 0), x_dir=(0, 1, 0), z_dir=(1, 0, 0))) as filete3_piece_10:
        with BuildLine():
            CenterArc((FILETE3_R, FILETE3_R), FILETE3_R, 180, 90)
            Line((0, FILETE3_R), (0, 0))
            Line((0, 0), (FILETE3_R, 0))
        make_face()
    extrude(amount=52.7, mode=Mode.SUBTRACT)


solid = part.part
